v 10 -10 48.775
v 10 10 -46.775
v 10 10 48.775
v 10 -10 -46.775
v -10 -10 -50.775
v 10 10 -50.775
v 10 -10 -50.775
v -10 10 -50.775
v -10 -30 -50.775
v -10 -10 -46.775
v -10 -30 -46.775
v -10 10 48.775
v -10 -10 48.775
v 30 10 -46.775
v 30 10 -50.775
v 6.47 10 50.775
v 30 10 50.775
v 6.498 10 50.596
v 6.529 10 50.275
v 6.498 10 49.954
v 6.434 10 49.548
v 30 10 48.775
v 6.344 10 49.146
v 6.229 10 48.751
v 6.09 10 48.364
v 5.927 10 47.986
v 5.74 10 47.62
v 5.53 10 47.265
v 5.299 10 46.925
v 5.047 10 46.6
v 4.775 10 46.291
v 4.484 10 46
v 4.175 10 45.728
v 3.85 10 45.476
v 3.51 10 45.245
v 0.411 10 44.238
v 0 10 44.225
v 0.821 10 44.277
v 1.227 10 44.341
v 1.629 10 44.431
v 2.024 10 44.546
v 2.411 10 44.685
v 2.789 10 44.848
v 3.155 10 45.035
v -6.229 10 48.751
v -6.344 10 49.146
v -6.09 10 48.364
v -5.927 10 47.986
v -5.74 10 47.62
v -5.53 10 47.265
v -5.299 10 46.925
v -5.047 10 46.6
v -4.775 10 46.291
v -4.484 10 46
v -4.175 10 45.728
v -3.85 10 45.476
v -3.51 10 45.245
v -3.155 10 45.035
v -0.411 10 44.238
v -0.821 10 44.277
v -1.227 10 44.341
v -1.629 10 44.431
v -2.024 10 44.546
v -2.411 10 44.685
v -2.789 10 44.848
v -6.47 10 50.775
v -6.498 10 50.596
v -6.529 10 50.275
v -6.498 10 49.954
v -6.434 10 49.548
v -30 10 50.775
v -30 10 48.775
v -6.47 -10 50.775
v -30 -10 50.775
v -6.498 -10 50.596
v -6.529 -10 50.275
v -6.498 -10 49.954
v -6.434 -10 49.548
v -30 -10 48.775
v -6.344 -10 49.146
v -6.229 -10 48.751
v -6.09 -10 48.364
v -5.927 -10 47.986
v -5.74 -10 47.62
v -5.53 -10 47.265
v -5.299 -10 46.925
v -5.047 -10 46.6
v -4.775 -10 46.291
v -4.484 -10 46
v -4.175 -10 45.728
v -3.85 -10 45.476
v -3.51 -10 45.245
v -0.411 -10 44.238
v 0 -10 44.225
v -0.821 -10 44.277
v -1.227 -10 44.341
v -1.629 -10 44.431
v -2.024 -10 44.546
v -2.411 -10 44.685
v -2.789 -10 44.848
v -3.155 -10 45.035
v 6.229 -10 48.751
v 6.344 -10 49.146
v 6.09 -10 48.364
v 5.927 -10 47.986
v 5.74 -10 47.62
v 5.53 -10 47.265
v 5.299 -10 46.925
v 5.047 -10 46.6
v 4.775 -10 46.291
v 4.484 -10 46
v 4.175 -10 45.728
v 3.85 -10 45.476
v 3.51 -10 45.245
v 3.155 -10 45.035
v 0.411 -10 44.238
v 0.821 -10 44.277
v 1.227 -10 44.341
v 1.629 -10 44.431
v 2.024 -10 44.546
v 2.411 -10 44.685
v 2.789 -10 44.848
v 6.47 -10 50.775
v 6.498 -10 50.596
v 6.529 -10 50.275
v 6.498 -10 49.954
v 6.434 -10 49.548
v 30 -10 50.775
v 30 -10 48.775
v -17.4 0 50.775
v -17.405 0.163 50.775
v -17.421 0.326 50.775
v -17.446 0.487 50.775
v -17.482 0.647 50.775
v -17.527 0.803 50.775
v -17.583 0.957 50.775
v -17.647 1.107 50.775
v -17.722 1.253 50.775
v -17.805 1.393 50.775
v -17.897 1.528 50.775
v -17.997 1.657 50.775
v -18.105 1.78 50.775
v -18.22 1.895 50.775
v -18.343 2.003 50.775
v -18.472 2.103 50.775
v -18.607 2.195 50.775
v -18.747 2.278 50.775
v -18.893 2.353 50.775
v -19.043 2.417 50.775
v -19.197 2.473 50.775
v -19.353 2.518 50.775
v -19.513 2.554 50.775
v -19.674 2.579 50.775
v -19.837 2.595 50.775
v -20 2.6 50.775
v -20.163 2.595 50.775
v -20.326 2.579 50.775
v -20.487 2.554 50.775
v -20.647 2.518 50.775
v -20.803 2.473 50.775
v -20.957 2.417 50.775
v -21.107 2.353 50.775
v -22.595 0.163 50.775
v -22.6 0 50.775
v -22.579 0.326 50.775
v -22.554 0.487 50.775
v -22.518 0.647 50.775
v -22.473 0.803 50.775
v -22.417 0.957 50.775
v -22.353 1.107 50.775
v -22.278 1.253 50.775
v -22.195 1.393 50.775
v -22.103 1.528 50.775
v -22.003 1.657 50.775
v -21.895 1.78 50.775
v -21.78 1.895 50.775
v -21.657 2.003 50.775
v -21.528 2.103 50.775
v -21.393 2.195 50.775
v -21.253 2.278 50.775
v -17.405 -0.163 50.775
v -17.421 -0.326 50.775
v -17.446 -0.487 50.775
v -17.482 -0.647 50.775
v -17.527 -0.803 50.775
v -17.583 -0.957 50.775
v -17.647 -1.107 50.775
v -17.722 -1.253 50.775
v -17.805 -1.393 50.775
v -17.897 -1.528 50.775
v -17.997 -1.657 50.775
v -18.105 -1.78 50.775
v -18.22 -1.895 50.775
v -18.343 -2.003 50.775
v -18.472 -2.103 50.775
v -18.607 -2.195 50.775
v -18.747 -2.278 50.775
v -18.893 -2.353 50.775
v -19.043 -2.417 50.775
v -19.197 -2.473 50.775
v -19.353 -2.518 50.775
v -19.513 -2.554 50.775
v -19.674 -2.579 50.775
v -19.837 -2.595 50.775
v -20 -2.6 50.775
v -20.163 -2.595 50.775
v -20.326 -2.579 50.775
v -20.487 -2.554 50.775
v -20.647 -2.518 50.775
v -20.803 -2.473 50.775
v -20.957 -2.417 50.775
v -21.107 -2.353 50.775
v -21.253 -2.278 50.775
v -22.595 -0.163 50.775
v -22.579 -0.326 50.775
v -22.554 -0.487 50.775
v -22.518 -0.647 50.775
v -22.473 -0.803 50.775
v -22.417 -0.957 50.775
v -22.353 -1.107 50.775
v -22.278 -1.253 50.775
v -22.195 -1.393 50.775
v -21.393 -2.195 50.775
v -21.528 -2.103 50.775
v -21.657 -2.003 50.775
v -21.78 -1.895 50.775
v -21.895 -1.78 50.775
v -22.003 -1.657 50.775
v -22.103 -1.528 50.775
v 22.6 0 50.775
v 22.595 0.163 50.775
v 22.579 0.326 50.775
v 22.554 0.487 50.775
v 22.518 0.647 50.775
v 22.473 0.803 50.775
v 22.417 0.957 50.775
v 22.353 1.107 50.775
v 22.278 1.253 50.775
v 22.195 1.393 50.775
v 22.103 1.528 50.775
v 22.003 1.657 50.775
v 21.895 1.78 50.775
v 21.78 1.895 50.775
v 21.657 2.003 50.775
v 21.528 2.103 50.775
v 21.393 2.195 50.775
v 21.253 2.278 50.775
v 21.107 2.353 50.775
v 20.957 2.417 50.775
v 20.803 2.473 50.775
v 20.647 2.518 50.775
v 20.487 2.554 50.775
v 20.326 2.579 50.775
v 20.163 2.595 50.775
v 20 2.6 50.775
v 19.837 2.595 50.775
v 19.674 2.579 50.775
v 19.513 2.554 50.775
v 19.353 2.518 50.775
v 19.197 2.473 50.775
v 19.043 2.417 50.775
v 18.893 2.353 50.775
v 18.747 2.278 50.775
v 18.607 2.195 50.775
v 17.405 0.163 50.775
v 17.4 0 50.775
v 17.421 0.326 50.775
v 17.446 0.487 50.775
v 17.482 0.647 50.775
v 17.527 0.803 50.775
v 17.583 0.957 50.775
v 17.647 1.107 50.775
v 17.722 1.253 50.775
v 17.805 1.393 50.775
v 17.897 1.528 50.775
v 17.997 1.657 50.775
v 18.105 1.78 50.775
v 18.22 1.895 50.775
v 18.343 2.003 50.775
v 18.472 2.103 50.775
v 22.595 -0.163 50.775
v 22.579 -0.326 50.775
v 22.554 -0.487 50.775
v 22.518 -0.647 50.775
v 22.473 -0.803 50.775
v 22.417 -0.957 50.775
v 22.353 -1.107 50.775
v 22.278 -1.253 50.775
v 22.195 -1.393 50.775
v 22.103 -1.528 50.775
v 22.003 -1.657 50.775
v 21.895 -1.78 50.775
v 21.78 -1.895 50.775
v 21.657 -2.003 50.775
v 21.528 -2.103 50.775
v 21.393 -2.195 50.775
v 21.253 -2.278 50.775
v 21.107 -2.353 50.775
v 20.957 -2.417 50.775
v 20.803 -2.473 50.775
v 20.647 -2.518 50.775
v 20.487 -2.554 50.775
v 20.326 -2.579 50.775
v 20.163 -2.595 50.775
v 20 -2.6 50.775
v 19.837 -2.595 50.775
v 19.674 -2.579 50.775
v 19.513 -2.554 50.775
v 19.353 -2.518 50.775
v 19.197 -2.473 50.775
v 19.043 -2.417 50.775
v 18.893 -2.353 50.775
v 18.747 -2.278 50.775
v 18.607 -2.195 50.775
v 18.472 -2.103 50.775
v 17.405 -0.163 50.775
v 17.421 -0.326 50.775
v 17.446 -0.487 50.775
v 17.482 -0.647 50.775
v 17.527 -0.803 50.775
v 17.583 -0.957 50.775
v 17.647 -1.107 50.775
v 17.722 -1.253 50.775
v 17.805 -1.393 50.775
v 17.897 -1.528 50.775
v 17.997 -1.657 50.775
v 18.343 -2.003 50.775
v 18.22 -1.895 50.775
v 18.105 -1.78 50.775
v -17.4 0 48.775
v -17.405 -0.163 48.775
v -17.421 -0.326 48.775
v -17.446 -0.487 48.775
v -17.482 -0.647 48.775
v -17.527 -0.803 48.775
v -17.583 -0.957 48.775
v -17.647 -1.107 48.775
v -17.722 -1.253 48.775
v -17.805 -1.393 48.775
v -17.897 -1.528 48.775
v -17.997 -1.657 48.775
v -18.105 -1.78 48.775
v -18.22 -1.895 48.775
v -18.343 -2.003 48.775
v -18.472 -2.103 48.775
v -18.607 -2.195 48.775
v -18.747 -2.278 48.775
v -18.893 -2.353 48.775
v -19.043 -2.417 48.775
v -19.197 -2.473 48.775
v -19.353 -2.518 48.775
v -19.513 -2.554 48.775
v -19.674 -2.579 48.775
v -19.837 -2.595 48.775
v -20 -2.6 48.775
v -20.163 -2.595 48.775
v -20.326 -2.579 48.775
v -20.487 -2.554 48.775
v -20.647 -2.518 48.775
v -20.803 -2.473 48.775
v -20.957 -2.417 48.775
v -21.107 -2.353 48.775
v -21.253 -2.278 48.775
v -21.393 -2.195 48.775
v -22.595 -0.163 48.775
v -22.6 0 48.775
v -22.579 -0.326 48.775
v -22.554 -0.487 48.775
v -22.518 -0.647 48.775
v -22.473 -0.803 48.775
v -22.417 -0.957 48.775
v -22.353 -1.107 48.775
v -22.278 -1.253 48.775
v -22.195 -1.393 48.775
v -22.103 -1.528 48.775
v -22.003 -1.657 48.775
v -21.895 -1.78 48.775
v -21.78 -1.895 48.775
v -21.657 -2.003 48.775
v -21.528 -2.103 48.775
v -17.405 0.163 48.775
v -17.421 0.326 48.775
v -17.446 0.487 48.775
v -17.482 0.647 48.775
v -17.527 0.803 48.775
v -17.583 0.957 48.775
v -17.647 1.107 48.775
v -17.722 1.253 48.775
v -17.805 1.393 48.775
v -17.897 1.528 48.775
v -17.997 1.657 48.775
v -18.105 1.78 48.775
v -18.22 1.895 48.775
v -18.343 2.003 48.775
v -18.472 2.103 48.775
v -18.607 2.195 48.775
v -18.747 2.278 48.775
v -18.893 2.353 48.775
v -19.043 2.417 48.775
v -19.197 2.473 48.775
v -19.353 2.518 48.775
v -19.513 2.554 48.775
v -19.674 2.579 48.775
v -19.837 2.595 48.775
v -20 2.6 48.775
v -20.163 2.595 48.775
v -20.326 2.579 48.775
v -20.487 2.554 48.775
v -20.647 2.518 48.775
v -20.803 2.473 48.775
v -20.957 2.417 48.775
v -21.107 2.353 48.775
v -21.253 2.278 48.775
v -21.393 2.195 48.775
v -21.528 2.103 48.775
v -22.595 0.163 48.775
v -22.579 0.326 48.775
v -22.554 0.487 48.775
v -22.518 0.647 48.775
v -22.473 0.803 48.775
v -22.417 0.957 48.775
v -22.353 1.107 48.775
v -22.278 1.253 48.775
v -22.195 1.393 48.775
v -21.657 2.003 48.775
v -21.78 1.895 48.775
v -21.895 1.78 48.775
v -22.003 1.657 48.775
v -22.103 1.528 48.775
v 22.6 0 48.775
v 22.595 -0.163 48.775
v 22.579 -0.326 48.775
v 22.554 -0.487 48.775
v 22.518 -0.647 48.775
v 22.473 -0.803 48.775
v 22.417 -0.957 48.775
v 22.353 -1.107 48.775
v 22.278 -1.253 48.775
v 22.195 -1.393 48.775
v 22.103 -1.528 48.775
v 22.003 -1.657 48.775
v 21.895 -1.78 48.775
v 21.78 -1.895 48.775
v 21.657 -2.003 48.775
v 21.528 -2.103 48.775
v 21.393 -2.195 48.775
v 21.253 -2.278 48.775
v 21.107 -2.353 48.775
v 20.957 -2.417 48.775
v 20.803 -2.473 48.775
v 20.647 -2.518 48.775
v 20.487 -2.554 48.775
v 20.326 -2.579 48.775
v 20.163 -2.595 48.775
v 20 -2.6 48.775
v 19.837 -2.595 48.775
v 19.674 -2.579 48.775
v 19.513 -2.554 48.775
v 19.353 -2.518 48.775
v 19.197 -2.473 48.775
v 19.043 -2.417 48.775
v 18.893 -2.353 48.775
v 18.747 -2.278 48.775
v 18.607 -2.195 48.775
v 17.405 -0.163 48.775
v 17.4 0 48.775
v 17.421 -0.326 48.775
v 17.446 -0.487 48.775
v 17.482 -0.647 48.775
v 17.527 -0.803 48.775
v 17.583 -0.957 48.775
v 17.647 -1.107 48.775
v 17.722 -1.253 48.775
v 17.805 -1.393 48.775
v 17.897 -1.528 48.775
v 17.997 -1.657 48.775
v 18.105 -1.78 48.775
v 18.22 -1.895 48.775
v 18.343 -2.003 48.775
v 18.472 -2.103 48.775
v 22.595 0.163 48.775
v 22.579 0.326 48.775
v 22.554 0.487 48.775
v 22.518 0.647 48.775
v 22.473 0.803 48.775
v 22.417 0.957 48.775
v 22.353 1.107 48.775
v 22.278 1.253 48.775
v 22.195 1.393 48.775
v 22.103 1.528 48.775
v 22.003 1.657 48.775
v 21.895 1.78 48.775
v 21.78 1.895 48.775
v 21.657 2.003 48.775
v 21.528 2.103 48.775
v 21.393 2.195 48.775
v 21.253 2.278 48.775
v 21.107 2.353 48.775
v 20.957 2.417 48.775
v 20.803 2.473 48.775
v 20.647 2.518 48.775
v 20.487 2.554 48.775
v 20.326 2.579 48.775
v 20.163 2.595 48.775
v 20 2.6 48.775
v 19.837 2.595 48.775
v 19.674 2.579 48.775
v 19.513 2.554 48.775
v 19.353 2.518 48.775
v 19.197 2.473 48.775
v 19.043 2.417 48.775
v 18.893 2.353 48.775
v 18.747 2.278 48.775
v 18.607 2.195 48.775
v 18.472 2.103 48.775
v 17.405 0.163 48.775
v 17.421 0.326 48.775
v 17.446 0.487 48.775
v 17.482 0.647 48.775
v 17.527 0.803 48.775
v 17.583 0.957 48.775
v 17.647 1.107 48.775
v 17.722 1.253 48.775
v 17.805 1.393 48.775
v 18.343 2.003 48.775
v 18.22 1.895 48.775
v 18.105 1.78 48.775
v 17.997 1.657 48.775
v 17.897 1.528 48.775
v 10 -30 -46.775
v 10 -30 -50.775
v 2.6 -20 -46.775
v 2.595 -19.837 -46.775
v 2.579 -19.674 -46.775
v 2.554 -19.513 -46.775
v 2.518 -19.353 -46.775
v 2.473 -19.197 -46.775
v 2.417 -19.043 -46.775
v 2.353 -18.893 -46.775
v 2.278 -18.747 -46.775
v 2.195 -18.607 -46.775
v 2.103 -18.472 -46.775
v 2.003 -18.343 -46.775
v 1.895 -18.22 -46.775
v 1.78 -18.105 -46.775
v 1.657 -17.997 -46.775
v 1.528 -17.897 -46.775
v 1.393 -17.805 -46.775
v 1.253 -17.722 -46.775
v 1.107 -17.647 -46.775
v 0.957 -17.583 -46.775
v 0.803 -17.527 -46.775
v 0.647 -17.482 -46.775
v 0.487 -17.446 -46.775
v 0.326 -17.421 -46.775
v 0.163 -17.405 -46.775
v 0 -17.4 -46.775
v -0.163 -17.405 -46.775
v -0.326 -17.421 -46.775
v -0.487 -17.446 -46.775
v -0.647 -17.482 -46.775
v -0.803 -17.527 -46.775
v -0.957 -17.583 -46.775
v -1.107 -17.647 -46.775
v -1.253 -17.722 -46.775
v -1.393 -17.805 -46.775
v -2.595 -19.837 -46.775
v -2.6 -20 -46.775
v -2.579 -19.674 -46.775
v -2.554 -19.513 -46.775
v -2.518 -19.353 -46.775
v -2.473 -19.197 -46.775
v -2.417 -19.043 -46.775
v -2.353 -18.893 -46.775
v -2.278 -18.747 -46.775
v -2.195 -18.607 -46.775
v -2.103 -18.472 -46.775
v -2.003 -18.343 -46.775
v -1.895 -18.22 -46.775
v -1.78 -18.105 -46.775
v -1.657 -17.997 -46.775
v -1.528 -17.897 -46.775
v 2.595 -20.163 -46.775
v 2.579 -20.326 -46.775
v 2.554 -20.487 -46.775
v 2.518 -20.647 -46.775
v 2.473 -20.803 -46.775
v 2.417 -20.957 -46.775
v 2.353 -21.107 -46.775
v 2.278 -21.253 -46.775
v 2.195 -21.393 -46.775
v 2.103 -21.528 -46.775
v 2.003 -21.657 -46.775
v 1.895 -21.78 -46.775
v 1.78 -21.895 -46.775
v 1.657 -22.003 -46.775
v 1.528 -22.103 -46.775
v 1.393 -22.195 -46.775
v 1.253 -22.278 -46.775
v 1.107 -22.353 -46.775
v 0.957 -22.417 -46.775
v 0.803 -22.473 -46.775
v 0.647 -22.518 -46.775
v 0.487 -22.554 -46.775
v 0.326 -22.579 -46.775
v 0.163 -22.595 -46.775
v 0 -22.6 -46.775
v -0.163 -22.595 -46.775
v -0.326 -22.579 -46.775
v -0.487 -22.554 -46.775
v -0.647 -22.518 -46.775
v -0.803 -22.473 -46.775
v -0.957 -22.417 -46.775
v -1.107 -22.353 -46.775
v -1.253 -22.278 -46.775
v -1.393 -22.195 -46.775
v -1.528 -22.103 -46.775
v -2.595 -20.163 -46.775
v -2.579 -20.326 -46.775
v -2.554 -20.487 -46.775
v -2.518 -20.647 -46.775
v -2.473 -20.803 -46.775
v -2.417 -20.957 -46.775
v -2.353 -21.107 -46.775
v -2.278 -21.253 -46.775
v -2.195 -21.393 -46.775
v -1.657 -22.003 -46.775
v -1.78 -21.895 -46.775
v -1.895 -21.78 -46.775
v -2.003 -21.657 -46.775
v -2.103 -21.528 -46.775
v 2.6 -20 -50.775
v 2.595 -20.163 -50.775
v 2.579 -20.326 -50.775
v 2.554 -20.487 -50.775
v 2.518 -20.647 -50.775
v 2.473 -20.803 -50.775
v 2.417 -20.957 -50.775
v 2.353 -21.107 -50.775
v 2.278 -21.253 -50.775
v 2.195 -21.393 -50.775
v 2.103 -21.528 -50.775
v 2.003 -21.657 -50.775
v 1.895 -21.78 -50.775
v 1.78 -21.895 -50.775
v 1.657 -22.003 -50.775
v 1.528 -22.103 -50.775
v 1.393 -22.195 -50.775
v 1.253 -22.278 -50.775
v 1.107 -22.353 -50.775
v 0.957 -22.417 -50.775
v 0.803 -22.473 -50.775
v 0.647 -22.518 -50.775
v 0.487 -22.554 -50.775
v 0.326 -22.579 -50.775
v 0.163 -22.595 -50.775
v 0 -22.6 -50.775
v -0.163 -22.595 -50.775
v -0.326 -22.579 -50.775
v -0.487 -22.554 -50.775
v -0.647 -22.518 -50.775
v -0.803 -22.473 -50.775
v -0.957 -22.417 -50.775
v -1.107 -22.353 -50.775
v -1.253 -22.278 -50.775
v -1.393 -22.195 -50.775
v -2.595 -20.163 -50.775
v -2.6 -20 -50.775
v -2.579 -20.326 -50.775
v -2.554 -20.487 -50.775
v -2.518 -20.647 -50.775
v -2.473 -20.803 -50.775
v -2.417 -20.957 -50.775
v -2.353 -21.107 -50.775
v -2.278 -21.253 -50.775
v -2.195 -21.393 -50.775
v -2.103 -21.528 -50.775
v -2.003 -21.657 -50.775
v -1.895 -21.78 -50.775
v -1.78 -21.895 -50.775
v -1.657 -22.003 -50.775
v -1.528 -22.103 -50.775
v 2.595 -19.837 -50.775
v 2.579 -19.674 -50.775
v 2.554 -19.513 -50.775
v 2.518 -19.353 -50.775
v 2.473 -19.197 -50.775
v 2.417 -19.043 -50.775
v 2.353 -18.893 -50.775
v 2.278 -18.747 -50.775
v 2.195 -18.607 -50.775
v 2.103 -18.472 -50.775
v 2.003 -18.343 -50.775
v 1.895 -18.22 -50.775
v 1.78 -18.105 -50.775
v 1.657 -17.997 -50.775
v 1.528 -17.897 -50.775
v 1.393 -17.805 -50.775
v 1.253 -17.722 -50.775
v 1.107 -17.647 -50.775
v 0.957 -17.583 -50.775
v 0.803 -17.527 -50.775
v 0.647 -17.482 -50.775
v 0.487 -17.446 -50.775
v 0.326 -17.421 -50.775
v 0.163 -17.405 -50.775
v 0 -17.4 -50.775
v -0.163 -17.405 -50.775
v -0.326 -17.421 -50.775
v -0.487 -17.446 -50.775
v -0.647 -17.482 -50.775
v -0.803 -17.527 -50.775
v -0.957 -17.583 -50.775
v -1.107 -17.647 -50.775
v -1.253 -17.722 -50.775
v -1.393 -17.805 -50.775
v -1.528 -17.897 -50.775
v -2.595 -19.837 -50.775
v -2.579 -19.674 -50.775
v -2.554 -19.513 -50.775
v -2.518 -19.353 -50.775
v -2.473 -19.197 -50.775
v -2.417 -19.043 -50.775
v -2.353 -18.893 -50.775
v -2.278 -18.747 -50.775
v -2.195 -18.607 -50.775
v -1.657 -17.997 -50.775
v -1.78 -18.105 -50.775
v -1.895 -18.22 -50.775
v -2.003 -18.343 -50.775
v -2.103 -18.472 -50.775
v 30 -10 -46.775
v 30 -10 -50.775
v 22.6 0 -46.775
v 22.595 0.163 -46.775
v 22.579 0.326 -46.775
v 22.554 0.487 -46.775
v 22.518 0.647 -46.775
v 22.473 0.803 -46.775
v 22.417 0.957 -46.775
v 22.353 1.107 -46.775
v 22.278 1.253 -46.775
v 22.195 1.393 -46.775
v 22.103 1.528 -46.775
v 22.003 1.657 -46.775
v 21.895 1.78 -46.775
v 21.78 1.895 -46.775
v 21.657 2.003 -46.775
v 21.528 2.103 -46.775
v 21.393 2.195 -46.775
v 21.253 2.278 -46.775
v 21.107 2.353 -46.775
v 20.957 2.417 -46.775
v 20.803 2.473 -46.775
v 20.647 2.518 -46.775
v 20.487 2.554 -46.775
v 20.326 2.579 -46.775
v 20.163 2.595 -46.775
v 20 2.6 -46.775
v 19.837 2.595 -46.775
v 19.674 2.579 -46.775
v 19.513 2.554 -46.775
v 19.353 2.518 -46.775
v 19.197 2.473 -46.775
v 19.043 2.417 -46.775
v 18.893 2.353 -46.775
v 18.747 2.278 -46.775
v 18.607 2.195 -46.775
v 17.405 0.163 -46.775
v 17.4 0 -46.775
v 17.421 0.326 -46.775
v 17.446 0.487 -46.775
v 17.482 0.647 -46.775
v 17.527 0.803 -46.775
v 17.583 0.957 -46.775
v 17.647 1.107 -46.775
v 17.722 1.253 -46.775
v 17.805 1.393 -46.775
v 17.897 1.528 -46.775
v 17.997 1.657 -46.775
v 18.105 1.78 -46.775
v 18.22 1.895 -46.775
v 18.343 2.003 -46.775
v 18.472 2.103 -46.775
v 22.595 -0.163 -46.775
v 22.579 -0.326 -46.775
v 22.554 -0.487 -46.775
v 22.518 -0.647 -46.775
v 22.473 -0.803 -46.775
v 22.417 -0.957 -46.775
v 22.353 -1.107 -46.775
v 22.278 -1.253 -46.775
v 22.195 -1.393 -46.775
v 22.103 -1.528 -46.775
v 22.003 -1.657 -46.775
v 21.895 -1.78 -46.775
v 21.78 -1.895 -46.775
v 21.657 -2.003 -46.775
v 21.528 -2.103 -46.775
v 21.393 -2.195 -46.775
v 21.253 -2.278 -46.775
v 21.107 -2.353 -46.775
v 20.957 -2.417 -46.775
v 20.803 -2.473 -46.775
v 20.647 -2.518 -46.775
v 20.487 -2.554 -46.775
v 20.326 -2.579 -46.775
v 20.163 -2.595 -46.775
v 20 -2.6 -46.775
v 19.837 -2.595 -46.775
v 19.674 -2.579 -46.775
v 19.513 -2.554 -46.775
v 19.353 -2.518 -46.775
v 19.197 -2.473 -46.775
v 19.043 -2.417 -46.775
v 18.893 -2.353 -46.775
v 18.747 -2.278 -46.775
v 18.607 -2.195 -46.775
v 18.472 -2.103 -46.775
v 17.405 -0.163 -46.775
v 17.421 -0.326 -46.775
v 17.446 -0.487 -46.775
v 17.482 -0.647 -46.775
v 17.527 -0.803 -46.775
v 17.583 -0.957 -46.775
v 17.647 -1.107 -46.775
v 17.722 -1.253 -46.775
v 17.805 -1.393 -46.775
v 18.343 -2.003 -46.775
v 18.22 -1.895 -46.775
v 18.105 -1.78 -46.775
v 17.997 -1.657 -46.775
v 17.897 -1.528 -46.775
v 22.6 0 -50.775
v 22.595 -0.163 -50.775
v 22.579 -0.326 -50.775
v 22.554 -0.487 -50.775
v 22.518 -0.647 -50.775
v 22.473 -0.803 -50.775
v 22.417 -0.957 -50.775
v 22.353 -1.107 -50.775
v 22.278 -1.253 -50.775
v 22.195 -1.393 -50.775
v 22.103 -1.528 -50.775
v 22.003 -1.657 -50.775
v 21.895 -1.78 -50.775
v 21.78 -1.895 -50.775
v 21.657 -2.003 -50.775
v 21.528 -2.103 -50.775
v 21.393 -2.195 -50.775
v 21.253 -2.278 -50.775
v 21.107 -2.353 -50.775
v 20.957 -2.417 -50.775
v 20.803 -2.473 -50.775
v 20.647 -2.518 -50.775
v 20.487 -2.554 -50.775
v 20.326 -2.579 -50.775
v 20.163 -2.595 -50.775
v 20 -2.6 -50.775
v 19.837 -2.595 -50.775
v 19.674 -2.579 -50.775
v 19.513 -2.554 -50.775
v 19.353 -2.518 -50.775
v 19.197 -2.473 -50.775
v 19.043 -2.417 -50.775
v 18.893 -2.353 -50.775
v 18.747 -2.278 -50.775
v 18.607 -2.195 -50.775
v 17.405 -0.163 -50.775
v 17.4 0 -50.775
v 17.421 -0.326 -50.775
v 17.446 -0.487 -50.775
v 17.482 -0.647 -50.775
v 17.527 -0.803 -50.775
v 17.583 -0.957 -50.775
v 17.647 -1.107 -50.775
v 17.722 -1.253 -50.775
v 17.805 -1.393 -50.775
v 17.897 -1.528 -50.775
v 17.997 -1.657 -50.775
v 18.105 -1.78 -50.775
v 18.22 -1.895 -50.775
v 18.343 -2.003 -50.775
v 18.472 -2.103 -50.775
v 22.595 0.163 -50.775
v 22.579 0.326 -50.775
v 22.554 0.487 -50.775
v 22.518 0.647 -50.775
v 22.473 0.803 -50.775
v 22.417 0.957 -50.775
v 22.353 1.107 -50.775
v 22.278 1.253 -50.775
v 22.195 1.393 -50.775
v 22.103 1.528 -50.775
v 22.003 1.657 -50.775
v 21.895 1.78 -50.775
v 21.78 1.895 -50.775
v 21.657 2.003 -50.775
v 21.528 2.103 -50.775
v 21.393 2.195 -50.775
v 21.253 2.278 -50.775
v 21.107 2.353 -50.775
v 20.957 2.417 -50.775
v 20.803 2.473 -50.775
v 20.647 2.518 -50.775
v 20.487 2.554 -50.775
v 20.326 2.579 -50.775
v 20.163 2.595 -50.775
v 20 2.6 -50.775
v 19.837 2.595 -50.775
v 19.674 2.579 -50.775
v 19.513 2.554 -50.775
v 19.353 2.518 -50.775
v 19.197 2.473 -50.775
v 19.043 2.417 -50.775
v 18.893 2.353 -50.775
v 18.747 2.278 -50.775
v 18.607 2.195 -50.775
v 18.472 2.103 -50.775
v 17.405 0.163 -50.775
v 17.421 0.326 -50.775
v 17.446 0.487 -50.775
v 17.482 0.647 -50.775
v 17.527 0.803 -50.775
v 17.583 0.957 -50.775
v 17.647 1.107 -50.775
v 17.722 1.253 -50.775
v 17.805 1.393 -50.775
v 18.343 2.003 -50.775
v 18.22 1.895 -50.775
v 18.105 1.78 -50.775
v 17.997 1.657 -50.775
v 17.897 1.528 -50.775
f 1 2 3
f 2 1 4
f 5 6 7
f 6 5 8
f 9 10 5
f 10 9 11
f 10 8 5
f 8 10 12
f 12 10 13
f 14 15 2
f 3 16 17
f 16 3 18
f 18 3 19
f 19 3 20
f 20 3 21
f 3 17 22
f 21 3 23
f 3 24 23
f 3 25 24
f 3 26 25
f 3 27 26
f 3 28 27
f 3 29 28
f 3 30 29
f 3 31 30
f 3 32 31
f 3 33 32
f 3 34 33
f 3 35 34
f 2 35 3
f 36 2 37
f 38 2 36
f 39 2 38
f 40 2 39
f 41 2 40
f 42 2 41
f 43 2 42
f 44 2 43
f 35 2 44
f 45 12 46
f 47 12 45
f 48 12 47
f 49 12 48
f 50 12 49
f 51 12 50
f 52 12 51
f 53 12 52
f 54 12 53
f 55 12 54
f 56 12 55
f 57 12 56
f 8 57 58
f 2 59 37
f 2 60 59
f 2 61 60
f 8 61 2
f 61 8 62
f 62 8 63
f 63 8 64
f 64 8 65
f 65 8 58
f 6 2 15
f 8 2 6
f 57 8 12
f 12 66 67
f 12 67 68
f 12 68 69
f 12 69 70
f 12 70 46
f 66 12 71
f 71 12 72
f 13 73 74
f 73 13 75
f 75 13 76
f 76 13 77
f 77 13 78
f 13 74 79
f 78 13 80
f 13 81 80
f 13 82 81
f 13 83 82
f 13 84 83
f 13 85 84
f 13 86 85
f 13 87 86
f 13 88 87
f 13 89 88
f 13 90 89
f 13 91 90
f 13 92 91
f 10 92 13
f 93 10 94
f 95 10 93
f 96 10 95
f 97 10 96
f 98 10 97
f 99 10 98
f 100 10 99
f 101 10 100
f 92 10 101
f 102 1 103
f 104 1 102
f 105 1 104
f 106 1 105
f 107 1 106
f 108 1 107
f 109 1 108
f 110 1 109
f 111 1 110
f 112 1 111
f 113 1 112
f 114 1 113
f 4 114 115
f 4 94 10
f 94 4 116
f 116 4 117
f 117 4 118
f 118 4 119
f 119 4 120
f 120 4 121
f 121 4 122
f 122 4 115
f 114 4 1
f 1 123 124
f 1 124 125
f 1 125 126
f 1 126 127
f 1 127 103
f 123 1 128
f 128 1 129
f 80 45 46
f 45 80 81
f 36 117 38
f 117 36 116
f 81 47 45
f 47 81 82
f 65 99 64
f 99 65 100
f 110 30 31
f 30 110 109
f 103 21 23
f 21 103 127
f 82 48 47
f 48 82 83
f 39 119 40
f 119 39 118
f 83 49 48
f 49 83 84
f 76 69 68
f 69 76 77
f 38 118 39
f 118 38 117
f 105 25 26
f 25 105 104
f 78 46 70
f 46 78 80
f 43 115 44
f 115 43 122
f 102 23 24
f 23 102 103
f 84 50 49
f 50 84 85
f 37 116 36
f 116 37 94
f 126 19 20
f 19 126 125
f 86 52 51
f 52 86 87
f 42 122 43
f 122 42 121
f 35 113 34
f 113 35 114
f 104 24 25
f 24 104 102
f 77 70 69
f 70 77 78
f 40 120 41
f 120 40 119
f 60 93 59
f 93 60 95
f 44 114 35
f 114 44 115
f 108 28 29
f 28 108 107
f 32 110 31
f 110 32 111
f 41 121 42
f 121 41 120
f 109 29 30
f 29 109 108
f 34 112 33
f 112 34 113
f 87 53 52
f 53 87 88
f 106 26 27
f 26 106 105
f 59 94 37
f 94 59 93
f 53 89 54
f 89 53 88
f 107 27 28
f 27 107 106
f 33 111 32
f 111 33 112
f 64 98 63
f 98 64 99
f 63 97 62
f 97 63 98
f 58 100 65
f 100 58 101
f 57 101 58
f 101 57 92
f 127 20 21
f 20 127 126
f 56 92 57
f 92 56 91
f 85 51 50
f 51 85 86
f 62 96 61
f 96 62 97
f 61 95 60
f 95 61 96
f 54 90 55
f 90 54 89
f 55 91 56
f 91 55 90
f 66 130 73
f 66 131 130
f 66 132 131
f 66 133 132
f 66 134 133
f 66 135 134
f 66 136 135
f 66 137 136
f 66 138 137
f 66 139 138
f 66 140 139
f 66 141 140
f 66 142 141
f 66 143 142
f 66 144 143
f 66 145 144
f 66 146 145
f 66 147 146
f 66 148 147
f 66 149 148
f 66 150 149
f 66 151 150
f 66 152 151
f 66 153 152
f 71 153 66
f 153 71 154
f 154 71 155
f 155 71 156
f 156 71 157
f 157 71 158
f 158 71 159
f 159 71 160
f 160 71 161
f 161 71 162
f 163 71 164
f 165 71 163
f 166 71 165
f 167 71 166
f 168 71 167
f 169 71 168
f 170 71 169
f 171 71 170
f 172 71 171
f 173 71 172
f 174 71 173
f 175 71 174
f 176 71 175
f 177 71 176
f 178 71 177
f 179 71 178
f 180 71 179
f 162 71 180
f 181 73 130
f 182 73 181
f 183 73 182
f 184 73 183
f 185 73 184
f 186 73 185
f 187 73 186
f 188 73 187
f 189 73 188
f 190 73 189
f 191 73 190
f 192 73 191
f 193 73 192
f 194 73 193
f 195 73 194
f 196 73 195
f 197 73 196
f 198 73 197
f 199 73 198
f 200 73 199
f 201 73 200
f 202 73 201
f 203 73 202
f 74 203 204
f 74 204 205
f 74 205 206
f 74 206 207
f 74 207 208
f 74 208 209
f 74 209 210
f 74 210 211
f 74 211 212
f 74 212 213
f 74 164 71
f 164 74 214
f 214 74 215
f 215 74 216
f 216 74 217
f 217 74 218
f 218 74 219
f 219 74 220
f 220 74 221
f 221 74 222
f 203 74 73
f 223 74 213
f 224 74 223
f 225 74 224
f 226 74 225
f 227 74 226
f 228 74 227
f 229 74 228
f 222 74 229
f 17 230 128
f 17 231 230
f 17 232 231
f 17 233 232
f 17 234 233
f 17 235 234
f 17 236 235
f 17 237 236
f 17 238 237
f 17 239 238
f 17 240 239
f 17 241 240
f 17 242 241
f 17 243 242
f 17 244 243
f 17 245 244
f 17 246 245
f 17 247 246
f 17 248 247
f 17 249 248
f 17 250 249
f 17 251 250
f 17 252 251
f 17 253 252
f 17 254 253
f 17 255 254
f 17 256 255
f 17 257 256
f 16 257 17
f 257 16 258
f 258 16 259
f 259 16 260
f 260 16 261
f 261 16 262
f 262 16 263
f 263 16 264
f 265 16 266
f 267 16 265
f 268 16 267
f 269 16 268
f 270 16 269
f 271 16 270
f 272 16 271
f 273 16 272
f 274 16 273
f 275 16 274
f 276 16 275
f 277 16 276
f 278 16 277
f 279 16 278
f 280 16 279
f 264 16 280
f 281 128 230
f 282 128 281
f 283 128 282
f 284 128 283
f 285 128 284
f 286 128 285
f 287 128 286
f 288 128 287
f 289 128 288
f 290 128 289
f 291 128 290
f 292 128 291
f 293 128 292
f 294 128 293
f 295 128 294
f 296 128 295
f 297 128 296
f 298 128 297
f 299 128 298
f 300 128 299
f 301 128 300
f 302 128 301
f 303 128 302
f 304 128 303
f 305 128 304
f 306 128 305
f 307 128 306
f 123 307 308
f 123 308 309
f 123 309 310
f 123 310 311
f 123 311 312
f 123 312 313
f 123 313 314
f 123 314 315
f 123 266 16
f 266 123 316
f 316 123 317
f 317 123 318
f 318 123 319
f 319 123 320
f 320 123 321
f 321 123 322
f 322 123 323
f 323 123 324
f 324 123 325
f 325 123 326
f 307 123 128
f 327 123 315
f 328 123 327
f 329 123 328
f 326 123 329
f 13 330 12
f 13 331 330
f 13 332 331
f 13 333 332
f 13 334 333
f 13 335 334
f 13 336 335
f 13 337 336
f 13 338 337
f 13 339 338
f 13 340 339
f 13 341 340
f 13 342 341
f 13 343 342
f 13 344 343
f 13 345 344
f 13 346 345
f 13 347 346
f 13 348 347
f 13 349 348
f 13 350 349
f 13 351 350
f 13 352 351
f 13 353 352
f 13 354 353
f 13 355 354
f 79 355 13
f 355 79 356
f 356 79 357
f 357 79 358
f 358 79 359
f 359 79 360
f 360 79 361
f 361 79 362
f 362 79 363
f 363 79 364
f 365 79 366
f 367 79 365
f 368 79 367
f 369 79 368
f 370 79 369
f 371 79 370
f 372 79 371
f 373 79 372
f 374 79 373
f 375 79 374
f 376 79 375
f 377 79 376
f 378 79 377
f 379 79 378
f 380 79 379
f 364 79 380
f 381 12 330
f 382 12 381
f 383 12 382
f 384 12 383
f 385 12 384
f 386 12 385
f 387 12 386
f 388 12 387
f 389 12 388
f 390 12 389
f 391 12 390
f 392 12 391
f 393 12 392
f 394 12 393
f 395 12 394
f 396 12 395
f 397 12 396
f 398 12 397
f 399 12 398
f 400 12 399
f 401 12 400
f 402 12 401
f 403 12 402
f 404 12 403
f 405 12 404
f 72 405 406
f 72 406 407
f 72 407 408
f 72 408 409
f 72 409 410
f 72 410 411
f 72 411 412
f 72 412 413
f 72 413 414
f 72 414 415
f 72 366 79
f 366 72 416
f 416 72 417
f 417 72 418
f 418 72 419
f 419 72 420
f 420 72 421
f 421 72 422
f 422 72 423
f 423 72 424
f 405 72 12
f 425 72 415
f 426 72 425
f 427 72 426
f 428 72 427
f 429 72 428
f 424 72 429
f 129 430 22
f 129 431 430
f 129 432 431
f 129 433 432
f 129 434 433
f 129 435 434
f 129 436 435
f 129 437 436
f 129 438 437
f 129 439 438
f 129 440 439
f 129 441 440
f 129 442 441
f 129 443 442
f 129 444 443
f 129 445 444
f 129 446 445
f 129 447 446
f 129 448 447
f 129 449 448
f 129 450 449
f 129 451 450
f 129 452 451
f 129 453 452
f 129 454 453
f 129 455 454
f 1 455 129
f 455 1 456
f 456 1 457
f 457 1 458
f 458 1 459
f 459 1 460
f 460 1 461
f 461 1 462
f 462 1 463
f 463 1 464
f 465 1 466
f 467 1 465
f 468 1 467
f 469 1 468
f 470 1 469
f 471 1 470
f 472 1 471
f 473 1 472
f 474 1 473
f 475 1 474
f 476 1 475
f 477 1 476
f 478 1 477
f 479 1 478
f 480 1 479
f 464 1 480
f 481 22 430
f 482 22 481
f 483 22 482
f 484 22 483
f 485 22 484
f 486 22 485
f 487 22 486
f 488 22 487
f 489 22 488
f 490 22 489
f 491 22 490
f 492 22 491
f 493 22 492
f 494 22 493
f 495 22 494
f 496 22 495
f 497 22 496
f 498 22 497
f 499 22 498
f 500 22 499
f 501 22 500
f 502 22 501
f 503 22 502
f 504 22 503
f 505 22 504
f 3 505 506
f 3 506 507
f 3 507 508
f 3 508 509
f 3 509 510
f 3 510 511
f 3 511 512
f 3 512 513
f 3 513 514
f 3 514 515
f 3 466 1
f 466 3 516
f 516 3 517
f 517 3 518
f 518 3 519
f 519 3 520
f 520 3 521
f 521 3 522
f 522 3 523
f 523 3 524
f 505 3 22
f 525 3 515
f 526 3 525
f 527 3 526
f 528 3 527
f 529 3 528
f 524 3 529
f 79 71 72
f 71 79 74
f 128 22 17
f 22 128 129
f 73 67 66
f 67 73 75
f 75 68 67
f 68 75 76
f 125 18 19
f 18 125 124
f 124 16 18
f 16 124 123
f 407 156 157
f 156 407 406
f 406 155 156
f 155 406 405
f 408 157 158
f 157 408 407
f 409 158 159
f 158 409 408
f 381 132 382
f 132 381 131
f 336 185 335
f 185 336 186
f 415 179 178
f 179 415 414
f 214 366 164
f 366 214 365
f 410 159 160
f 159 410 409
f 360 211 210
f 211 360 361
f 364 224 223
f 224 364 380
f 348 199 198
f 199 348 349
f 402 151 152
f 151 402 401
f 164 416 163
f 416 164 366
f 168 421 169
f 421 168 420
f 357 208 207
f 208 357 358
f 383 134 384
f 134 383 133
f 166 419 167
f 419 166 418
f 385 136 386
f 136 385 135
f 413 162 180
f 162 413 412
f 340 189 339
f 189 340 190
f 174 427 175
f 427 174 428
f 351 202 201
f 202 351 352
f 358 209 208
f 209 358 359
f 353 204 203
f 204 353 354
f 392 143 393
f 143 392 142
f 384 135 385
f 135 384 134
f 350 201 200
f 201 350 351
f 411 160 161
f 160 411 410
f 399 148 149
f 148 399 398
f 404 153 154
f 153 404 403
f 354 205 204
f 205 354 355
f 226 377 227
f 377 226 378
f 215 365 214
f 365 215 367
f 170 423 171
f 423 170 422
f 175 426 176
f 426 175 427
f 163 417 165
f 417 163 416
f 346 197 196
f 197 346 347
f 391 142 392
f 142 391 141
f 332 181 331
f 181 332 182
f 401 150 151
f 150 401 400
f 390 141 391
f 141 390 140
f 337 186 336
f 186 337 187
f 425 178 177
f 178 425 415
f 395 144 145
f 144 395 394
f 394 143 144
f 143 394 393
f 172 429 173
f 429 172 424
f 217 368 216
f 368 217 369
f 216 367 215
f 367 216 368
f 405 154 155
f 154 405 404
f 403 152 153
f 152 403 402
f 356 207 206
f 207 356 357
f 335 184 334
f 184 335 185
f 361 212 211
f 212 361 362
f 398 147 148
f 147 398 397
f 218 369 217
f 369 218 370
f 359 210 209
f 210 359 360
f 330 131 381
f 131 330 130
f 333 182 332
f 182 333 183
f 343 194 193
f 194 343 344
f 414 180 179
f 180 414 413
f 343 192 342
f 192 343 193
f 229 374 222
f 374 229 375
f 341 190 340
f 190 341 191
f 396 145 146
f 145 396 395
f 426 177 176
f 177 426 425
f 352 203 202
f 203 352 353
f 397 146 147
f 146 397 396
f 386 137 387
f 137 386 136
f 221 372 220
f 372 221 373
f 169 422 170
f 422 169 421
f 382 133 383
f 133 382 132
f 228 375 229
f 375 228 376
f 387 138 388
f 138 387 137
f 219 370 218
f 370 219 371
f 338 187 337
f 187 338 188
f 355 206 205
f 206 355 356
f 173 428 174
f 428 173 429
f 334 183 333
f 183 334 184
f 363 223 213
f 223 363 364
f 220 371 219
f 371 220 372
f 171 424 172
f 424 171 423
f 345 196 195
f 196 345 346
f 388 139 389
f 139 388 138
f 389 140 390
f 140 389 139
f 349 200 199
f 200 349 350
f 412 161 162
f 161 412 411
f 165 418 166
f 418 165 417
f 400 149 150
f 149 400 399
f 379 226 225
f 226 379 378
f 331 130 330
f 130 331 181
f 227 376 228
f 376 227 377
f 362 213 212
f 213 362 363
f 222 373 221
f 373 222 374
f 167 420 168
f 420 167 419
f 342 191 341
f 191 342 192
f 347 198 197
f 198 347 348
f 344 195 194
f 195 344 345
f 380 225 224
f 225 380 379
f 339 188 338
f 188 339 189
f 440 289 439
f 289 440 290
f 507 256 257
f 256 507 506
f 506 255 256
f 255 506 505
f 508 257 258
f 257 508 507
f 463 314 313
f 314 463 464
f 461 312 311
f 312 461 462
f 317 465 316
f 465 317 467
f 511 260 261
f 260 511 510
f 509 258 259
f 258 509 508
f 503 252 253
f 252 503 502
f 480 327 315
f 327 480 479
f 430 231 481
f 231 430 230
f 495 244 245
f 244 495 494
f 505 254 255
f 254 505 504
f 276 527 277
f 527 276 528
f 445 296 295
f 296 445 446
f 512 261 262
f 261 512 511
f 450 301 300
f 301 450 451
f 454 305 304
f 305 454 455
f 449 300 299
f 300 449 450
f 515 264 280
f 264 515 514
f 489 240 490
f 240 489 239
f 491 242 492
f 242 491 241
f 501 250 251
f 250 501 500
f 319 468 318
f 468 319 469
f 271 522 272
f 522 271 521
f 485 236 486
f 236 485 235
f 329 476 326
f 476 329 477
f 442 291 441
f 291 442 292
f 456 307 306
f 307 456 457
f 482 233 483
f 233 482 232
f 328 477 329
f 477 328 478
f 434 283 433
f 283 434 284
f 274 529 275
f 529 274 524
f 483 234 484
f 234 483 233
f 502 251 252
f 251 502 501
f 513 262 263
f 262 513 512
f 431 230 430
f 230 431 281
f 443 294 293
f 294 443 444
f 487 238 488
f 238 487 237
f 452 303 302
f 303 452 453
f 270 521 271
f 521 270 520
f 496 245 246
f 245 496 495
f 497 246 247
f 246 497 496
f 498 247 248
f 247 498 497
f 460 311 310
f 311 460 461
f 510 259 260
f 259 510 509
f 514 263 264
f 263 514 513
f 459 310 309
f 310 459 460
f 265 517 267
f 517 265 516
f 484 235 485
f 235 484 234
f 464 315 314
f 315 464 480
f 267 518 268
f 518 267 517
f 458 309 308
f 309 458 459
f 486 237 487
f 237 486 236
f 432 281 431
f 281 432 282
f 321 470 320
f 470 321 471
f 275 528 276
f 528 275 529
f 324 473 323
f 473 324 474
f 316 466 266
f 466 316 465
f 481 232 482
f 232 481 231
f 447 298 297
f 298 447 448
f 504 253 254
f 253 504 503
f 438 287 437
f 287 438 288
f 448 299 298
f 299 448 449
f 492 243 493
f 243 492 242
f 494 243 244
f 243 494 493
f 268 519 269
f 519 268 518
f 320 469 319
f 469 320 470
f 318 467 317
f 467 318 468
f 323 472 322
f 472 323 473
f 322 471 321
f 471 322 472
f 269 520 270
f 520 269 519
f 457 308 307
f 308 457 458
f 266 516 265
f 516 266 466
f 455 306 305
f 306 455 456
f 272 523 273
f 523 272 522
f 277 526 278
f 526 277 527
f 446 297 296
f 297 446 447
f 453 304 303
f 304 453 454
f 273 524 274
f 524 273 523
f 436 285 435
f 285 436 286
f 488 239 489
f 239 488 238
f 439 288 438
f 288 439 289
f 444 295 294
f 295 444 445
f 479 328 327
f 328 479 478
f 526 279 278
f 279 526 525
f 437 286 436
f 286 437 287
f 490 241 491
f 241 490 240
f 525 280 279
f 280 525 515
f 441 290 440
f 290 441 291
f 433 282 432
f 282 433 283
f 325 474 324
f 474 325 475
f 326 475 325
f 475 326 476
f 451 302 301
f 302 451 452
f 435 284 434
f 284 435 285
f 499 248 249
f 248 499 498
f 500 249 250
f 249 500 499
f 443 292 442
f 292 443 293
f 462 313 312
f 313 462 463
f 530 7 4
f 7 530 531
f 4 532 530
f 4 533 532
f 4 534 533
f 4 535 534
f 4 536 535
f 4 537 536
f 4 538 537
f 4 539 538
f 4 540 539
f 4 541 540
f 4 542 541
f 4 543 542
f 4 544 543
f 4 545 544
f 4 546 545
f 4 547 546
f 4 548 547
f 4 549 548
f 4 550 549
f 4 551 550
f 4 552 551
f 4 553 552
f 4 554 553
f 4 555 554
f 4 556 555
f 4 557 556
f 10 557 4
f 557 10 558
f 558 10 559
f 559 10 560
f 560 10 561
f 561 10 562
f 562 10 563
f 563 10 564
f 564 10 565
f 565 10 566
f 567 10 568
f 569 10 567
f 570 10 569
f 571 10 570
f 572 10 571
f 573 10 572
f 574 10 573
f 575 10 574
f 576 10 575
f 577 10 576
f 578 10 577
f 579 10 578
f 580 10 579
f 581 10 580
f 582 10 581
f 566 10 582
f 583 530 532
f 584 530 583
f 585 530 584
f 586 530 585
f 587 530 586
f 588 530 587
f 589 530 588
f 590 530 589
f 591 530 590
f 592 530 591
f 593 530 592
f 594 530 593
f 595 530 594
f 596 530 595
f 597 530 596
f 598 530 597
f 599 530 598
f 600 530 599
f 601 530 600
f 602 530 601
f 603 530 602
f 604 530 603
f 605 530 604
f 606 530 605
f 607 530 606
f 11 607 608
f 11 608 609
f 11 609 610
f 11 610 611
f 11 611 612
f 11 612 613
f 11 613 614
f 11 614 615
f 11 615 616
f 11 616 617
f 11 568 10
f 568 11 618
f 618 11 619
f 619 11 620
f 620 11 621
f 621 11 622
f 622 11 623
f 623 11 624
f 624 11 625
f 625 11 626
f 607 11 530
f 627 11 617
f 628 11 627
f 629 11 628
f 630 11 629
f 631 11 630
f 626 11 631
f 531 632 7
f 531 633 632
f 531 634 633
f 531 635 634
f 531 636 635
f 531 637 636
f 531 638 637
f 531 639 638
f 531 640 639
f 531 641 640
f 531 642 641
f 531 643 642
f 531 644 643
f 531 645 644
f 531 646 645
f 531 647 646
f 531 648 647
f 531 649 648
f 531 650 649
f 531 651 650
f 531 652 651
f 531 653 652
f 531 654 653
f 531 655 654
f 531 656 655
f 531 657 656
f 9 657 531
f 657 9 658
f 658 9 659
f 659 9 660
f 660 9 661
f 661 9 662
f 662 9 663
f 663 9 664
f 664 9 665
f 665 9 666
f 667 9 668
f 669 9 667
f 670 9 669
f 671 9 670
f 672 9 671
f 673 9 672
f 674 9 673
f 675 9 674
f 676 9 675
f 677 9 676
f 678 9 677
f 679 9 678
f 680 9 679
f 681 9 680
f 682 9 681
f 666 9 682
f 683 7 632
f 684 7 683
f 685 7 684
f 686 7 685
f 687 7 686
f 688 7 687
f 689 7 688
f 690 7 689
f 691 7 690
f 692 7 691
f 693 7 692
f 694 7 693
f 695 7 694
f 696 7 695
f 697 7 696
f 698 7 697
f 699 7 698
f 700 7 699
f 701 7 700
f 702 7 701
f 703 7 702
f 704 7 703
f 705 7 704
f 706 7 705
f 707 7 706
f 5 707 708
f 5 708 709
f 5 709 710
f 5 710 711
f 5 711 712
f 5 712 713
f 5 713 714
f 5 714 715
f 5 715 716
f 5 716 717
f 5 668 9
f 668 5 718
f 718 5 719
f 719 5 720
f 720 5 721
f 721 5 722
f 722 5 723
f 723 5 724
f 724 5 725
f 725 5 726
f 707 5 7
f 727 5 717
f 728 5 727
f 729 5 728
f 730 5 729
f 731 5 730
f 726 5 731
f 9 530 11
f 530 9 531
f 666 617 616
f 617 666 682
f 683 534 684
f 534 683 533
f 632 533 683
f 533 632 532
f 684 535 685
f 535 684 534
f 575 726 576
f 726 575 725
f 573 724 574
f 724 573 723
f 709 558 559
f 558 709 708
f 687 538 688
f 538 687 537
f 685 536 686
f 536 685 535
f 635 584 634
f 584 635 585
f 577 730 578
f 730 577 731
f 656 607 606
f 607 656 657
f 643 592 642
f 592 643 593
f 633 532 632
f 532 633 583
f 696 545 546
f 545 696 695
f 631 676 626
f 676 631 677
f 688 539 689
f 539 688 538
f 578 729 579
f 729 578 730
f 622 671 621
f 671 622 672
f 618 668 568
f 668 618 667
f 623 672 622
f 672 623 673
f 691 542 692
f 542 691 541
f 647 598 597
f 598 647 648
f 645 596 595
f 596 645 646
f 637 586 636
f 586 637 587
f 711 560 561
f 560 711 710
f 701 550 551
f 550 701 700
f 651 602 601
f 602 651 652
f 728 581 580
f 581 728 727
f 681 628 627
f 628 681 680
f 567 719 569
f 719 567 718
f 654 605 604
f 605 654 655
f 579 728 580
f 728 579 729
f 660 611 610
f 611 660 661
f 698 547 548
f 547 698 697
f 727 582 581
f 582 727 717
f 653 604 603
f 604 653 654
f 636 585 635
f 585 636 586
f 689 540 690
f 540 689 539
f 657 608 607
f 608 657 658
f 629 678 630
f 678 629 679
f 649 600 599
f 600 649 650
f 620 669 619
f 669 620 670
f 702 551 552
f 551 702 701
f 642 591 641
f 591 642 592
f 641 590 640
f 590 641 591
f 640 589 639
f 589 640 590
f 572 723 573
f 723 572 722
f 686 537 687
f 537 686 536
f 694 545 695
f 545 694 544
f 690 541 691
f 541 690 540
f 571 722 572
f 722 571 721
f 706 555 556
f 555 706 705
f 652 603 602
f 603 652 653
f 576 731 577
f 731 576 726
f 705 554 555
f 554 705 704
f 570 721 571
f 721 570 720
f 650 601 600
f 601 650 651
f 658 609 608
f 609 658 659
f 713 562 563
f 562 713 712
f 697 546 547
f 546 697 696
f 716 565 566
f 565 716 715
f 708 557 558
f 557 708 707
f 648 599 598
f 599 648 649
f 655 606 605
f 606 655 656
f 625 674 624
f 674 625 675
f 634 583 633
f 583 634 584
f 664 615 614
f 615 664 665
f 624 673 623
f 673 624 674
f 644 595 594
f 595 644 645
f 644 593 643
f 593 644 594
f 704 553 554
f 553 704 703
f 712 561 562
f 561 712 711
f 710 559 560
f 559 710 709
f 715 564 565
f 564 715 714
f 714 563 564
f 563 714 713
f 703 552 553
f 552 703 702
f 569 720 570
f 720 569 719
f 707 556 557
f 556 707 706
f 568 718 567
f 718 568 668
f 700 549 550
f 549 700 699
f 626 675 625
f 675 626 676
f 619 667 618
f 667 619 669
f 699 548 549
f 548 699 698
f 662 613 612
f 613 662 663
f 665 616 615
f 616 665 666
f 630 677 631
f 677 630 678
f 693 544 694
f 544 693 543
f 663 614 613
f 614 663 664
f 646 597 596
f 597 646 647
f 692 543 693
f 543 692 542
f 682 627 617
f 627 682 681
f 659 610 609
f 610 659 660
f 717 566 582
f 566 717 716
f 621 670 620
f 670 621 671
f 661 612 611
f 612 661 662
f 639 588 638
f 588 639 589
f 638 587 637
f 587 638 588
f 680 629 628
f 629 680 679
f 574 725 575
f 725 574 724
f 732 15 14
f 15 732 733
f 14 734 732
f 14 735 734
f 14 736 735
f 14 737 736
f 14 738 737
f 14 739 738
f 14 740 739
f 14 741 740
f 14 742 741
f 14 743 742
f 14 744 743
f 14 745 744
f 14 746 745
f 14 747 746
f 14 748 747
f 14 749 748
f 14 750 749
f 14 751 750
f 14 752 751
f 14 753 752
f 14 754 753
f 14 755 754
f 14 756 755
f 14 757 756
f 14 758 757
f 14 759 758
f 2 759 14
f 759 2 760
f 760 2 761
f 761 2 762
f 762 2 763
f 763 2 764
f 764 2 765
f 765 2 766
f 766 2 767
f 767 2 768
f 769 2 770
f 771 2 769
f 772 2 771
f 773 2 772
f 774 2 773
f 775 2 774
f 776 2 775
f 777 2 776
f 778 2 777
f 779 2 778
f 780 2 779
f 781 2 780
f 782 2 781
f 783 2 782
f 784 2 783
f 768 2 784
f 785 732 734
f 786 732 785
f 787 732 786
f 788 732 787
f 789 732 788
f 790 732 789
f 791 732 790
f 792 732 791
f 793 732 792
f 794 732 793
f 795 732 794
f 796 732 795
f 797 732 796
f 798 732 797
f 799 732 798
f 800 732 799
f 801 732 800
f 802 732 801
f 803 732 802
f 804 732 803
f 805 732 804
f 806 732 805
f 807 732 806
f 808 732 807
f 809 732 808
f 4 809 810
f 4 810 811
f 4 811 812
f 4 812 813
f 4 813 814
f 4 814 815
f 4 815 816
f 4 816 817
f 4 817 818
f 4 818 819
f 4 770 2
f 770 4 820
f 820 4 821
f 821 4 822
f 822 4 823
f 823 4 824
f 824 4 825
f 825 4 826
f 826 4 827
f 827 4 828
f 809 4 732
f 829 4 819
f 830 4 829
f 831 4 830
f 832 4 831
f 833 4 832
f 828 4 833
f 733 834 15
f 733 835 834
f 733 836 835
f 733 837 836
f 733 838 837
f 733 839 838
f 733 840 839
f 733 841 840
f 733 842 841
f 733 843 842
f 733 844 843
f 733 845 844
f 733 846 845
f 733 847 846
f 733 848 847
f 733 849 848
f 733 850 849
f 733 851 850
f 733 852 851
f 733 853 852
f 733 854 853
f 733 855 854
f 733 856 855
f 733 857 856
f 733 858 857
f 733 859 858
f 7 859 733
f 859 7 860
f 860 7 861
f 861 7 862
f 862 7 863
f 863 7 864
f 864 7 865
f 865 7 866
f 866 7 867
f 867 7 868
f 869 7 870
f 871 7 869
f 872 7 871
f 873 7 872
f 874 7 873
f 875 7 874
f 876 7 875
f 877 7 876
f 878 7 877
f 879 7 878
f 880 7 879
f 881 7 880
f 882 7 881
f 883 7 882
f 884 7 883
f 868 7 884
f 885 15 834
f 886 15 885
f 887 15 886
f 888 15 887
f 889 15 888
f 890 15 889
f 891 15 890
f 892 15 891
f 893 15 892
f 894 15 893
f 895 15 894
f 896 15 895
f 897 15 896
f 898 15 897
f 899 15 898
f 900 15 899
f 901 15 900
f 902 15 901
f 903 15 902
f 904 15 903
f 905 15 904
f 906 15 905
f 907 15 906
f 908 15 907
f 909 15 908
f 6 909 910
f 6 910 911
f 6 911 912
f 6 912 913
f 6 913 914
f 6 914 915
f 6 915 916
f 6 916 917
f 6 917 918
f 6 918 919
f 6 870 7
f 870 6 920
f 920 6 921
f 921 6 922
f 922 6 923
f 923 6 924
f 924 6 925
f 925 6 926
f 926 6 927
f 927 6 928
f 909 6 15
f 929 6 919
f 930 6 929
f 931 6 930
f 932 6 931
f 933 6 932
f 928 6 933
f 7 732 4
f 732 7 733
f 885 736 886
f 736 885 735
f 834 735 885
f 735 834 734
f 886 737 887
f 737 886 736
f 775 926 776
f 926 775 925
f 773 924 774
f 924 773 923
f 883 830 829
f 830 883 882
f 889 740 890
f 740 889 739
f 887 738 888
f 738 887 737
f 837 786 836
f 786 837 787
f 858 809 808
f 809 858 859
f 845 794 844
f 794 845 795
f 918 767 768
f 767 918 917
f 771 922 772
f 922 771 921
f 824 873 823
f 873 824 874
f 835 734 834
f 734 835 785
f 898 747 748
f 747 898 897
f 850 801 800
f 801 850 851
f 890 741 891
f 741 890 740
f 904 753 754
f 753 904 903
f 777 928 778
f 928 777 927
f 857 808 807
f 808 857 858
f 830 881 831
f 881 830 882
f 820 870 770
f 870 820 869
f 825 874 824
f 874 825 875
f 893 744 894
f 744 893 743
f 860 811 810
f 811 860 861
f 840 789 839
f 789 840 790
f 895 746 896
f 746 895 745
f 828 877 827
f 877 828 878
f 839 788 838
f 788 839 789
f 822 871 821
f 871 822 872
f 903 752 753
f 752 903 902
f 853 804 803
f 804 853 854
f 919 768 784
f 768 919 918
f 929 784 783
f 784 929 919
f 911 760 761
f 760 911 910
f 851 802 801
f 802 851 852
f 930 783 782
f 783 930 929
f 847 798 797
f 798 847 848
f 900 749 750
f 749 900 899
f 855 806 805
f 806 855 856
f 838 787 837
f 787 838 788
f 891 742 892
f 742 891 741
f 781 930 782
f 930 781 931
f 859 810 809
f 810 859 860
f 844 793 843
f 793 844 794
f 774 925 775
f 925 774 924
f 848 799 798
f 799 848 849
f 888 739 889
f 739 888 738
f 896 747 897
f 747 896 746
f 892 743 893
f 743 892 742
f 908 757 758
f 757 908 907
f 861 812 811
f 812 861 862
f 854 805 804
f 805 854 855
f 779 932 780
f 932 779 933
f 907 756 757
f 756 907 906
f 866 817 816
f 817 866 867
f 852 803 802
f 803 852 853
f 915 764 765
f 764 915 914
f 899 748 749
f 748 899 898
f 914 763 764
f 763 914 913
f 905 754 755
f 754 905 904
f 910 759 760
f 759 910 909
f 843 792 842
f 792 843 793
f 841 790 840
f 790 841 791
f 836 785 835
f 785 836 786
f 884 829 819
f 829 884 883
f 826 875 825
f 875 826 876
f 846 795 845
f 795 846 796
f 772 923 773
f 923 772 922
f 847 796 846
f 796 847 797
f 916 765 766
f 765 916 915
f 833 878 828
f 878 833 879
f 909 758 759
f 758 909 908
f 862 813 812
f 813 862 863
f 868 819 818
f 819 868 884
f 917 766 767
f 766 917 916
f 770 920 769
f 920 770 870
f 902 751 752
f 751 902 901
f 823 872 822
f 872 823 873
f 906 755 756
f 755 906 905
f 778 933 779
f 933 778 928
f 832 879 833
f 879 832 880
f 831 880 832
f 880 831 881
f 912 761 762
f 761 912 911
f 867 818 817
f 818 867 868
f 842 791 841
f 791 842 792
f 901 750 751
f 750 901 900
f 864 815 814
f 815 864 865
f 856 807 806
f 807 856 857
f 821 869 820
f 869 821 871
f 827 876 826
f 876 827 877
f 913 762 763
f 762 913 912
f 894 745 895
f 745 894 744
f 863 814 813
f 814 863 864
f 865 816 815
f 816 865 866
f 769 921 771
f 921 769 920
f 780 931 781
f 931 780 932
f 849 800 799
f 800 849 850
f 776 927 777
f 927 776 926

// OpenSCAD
$fn=100;

w=20;
l=20;
w2=10.5;

in=25.4;

r=in/4 + .2;
h=40 + w2/2;
h_top=95+r;
echo(r);

flip=false;
top_tube=true;

    if(top_tube){
        difference(){
    cube([w,l,h_top],center=true);
        translate([0,0,h_top/2])
    rotate([90,0,0])
    translate([0,0,-h_top/2])
    cylinder(h_top,r,r);  
    
            
            }
            
            translate([0,0,(h_top/2-1)])
rotate([0,0,90])
difference(){
    cube([l,l*3,2],center=true);
    rotate([0,90,0])
    translate([0,0,-h_top/2])
    cylinder(h_top,r,r);    
    translate([0,l,-5])
    cylinder(20,2.6,2.6);
    translate([0,-l,-5])
    cylinder(20,2.6,2.6);
}

translate([0,0,-(h_top/2-2)])   { 
if(flip){
    difference(){
    translate([0,l,0])
    cube([w,l,4],center=true);
    translate([0,l,-5])
    cylinder(20,2.6,2.6);
    }
} else {
    difference(){
    translate([0,-l,0])
    cube([w,l,4],center=true);
    translate([0,-l,-5])
    cylinder(20,2.6,2.6);
    }
}

    difference(){
    translate([l,0,0])
    cube([w,l,4],center=true);
    translate([l,0,-5])
    cylinder(20,2.6,2.6);
    }}} 
    
    
    else {
        difference(){
    cube([w,l,h],center=true);
        translate([0,0,h/2])
    rotate([90,0,0])
    translate([0,0,-h/2])
    cylinder(h,r,r);  
    }
    
    translate([0,0,(h/2-1)])
rotate([0,0,90])
difference(){
    cube([l,l*3,2],center=true);
    rotate([0,90,0])
    translate([0,0,-h/2])
    cylinder(h,r,r);    
    translate([0,l,-5])
    cylinder(20,2.6,2.6);
    translate([0,-l,-5])
    cylinder(20,2.6,2.6);
}

translate([0,0,-(h/2-2)])   { 
if(flip){
    difference(){
    translate([0,l,0])
    cube([w,l,4],center=true);
    translate([0,l,-5])
    cylinder(20,2.6,2.6);
    }
} else {
    difference(){
    translate([0,-l,0])
    cube([w,l,4],center=true);
    translate([0,-l,-5])
    cylinder(20,2.6,2.6);
    }
}

    difference(){
    translate([l,0,0])
    cube([w,l,4],center=true);
    translate([l,0,-5])
    cylinder(20,2.6,2.6);
    }}
    }



    
